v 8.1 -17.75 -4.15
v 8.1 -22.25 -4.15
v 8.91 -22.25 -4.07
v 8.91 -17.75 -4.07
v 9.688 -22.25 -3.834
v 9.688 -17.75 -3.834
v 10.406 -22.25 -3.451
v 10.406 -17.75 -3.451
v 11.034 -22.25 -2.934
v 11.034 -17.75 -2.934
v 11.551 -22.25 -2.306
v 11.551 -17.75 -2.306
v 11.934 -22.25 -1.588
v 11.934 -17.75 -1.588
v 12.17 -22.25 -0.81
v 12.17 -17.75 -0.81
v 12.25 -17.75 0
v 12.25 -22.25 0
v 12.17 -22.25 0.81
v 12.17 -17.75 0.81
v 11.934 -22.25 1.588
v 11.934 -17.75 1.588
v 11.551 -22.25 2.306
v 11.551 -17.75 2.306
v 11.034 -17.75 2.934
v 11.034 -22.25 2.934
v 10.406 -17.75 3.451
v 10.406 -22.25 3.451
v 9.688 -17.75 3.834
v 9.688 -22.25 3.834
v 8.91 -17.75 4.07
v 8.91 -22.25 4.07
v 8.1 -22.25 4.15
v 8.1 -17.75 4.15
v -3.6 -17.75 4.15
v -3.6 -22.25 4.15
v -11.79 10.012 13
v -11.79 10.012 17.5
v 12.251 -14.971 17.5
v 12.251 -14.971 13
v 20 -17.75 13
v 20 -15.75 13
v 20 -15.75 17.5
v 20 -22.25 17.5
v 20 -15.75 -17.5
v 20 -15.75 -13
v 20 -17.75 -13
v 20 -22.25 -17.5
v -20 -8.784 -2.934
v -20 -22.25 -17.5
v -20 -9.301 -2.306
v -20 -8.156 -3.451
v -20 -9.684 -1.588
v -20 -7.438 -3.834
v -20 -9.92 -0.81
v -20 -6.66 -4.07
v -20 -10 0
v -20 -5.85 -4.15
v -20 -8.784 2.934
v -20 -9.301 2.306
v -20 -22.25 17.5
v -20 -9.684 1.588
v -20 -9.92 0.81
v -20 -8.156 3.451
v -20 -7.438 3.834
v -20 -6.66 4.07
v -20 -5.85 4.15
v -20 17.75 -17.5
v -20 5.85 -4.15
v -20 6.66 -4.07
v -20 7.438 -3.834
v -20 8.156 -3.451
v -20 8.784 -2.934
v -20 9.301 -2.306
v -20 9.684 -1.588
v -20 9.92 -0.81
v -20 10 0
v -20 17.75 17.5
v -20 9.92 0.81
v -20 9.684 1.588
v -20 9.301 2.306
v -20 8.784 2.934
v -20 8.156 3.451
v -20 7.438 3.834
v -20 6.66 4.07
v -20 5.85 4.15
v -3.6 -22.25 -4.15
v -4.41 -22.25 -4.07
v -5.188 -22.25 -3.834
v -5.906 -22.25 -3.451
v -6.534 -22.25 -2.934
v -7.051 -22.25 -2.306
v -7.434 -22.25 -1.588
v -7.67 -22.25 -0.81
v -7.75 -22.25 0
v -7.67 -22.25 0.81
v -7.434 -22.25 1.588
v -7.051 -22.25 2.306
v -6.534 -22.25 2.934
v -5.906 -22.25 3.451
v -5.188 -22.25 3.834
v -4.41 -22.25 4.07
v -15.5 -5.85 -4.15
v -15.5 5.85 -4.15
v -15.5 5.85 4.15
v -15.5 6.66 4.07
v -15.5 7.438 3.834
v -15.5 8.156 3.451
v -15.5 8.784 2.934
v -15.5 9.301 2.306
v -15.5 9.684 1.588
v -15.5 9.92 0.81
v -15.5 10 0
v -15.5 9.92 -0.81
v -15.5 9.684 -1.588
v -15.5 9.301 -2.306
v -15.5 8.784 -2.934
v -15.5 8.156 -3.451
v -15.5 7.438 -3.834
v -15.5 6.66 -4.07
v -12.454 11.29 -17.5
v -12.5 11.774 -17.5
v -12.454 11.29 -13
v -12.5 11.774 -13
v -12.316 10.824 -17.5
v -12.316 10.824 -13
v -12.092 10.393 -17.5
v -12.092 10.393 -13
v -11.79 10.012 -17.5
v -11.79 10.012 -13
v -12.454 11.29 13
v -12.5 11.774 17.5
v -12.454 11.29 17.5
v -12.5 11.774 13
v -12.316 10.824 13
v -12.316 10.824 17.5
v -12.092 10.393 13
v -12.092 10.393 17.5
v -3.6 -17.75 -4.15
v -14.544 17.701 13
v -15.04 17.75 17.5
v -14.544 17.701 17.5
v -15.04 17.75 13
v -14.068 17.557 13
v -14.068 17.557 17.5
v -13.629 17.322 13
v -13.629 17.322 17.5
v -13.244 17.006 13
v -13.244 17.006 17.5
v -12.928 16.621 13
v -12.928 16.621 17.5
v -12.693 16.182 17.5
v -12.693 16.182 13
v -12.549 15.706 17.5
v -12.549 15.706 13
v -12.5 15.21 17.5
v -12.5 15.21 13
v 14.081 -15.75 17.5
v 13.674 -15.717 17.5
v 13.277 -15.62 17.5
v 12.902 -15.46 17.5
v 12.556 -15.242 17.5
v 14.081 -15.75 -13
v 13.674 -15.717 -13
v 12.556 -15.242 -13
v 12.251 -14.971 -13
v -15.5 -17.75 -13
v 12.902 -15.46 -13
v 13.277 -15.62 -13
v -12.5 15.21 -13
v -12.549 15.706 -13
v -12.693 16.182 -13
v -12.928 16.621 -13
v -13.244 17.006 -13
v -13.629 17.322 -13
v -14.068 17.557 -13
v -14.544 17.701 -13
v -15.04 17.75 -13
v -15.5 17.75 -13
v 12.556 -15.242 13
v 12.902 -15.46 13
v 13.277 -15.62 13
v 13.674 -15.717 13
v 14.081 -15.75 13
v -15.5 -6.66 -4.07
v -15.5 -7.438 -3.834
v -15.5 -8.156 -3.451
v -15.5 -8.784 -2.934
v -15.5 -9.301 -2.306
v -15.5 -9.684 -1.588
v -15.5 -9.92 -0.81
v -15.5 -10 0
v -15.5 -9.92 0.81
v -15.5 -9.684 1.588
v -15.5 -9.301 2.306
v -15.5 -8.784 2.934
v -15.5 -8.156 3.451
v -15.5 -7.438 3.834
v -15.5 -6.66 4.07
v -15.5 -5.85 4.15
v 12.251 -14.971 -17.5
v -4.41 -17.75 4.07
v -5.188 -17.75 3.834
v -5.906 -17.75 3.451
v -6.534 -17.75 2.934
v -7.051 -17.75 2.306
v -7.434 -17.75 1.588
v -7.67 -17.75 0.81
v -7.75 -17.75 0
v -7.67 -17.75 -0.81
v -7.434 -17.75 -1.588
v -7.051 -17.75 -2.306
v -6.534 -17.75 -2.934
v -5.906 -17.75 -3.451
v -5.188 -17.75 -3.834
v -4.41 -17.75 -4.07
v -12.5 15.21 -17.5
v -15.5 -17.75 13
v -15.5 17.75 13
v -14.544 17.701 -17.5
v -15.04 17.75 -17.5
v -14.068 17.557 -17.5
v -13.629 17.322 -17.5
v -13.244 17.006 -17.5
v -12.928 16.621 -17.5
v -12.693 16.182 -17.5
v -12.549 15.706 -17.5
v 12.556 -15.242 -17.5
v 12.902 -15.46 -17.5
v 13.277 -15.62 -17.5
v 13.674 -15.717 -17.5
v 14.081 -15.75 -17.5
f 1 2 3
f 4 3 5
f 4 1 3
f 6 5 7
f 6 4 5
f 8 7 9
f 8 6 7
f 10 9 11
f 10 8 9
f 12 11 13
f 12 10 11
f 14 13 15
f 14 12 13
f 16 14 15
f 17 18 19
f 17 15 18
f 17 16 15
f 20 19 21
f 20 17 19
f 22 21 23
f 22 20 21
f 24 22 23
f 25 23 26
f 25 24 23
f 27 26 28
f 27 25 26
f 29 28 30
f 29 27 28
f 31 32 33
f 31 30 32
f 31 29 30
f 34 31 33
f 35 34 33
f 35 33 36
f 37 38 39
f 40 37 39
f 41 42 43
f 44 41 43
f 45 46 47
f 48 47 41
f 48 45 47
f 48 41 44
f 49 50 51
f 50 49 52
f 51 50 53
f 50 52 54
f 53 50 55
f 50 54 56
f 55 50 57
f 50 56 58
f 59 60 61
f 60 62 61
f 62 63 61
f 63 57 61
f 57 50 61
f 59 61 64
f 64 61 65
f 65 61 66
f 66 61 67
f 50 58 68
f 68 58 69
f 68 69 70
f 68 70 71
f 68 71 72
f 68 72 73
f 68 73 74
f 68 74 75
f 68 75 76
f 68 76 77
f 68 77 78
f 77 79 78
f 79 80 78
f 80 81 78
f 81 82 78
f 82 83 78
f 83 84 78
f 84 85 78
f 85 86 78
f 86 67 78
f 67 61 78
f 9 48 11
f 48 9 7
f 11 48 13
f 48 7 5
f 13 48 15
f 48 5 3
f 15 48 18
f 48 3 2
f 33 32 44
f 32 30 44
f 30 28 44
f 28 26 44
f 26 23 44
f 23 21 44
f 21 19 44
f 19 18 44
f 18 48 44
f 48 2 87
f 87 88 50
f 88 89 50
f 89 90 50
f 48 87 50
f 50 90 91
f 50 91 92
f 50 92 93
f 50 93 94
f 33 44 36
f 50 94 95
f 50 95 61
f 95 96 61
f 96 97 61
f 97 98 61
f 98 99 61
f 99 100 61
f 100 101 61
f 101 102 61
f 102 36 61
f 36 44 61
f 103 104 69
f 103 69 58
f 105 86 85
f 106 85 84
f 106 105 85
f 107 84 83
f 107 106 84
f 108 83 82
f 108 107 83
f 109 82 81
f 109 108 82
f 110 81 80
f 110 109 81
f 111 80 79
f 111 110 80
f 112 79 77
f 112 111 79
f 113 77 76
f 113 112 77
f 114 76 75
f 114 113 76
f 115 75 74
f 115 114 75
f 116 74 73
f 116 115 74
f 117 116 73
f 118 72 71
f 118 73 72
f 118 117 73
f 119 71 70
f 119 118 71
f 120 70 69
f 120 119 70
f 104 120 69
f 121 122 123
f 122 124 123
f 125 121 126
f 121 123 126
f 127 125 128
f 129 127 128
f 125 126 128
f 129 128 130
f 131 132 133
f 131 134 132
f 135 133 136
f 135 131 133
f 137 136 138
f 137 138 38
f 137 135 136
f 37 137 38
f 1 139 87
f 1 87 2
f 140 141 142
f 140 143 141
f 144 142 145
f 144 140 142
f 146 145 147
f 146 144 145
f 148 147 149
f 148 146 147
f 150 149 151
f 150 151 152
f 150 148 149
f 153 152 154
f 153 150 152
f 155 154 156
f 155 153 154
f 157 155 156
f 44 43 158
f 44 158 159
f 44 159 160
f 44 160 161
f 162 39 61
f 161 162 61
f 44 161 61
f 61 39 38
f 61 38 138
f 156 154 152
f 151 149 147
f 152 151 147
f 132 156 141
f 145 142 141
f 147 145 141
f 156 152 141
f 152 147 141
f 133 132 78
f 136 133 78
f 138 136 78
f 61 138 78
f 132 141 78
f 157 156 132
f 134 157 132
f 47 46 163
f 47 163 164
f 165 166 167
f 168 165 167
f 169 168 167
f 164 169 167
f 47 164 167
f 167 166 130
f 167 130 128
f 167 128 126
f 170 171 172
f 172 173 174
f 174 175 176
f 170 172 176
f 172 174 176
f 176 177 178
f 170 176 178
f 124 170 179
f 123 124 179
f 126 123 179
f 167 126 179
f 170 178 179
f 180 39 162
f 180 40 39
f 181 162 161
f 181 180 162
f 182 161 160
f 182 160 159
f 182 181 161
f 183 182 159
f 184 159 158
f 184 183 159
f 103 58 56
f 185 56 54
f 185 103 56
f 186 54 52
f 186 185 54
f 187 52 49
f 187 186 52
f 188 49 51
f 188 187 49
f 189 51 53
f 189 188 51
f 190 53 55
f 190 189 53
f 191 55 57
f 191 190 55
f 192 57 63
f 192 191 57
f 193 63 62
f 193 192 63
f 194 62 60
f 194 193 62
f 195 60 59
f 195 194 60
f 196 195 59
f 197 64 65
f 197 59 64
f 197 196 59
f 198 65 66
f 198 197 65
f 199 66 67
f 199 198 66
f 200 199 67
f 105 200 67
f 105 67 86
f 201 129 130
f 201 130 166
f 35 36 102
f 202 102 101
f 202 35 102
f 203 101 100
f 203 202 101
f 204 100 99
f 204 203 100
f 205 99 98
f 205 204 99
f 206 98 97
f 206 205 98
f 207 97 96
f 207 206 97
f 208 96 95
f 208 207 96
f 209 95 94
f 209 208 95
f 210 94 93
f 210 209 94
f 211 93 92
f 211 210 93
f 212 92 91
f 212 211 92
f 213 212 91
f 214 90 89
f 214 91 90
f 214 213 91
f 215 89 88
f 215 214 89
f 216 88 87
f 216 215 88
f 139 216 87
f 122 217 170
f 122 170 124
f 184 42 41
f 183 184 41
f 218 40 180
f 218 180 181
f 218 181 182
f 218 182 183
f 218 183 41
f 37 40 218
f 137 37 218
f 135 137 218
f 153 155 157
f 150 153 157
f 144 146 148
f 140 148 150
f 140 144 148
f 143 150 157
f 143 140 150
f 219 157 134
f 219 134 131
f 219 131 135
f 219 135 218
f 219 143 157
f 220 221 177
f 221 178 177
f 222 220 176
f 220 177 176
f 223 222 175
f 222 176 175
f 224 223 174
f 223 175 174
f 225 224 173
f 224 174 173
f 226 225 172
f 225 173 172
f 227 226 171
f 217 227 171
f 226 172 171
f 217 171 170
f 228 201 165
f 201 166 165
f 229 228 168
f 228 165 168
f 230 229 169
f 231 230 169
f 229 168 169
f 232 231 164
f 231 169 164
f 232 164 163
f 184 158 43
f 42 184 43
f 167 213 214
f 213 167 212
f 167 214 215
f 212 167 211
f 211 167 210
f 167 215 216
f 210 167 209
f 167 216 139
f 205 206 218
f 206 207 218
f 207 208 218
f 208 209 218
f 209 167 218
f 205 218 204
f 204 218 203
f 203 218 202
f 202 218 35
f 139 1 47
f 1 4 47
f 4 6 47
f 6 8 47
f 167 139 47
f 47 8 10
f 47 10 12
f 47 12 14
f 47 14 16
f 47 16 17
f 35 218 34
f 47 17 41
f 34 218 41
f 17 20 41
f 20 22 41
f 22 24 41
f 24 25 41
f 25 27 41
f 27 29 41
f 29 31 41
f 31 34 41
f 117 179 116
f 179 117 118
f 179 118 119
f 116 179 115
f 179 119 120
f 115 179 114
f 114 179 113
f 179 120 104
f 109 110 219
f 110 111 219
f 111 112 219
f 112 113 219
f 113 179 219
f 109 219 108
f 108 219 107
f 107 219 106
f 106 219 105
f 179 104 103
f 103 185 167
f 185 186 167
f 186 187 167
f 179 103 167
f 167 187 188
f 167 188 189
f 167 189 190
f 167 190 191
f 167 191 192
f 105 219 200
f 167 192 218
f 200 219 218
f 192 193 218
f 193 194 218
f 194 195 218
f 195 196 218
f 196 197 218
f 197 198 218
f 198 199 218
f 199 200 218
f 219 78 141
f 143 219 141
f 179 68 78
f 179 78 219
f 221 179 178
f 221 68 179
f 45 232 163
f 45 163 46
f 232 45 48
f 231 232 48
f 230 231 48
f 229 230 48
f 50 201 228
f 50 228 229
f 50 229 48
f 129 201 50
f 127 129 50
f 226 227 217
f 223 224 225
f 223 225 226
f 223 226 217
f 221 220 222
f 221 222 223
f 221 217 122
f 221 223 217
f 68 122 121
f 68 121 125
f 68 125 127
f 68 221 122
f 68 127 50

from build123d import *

# Parameters (mm, degrees)
BOSS_EXTRUDE1_DEPTH = 17.5
BOSS_EXTRUDE2_DEPTH = 4.5
CUT_EXTRUDE1_DEPTH  = 5.5
CUT_EXTRUDE2_DEPTH  = 5.5
FILLET1_R           = 2.54


with BuildPart() as part:
    # Sketch1 → Boss-Extrude1 (new body, symmetric)
    with BuildSketch(Plane.XY):
        Polygon((-20, 17.75), (-15.5, 17.75), (-15.5, -17.75), (20, -17.75), (20, -22.25), (-20, -22.25), align=None)
    extrude(amount=BOSS_EXTRUDE1_DEPTH, both=True)

    # Sketch2 → Boss-Extrude2 (add)
    with BuildSketch(Plane.XY.offset(17.5)):
        Polygon((-15.5, 17.75), (-12.5, 17.75), (-12.5, 10.75), (13, -15.75), (20, -15.75), (20, -17.75), (-15.5, -17.75), align=None)
    boss_extrude2 = extrude(amount=-BOSS_EXTRUDE2_DEPTH)

    # Mirror1: Boss-Extrude2 across plane
    add(boss_extrude2.mirror(Plane.XY))

    # Sketch3 → Cut-Extrude1 (cut, through all)
    with BuildSketch(Plane(origin=(-15.5, 0, 0), x_dir=(0, 0, -1), z_dir=(1, 0, 0))):
        with BuildLine():
            Line((4.15, 5.85), (4.15, -5.85))
            ThreePointArc((4.15, -5.85), (0, -10), (-4.15, -5.85))
            Line((-4.15, -5.85), (-4.15, 5.85))
            ThreePointArc((-4.15, 5.85), (0, 10), (4.15, 5.85))
        make_face()
    extrude(amount=-CUT_EXTRUDE1_DEPTH, mode=Mode.SUBTRACT)

    # Sketch4 → Cut-Extrude2 (cut, through all)
    with BuildSketch(Plane(origin=(0, -17.75, 0), x_dir=(1, 0, 0), z_dir=(0, 1, 0))):
        with BuildLine():
            Line((-3.6, 4.15), (8.1, 4.15))
            ThreePointArc((8.1, 4.15), (12.25, 0), (8.1, -4.15))
            Line((8.1, -4.15), (-3.6, -4.15))
            ThreePointArc((-3.6, -4.15), (-7.75, 0), (-3.6, 4.15))
        make_face()
    extrude(amount=-CUT_EXTRUDE2_DEPTH, mode=Mode.SUBTRACT)

    # Fillet1
    fillet1_edges = [part.edges().sort_by_distance(p)[0] for p in [
        (-12.5, 17.75, 15.25),
        (-12.5, 10.75, 15.25),
        (13, -15.75, 15.25),
        (13, -15.75, -15.25),
        (-12.5, 10.75, -15.25),
        (-12.5, 17.75, -15.25),
    ]]
    fillet(fillet1_edges, radius=FILLET1_R)


solid = part.part
